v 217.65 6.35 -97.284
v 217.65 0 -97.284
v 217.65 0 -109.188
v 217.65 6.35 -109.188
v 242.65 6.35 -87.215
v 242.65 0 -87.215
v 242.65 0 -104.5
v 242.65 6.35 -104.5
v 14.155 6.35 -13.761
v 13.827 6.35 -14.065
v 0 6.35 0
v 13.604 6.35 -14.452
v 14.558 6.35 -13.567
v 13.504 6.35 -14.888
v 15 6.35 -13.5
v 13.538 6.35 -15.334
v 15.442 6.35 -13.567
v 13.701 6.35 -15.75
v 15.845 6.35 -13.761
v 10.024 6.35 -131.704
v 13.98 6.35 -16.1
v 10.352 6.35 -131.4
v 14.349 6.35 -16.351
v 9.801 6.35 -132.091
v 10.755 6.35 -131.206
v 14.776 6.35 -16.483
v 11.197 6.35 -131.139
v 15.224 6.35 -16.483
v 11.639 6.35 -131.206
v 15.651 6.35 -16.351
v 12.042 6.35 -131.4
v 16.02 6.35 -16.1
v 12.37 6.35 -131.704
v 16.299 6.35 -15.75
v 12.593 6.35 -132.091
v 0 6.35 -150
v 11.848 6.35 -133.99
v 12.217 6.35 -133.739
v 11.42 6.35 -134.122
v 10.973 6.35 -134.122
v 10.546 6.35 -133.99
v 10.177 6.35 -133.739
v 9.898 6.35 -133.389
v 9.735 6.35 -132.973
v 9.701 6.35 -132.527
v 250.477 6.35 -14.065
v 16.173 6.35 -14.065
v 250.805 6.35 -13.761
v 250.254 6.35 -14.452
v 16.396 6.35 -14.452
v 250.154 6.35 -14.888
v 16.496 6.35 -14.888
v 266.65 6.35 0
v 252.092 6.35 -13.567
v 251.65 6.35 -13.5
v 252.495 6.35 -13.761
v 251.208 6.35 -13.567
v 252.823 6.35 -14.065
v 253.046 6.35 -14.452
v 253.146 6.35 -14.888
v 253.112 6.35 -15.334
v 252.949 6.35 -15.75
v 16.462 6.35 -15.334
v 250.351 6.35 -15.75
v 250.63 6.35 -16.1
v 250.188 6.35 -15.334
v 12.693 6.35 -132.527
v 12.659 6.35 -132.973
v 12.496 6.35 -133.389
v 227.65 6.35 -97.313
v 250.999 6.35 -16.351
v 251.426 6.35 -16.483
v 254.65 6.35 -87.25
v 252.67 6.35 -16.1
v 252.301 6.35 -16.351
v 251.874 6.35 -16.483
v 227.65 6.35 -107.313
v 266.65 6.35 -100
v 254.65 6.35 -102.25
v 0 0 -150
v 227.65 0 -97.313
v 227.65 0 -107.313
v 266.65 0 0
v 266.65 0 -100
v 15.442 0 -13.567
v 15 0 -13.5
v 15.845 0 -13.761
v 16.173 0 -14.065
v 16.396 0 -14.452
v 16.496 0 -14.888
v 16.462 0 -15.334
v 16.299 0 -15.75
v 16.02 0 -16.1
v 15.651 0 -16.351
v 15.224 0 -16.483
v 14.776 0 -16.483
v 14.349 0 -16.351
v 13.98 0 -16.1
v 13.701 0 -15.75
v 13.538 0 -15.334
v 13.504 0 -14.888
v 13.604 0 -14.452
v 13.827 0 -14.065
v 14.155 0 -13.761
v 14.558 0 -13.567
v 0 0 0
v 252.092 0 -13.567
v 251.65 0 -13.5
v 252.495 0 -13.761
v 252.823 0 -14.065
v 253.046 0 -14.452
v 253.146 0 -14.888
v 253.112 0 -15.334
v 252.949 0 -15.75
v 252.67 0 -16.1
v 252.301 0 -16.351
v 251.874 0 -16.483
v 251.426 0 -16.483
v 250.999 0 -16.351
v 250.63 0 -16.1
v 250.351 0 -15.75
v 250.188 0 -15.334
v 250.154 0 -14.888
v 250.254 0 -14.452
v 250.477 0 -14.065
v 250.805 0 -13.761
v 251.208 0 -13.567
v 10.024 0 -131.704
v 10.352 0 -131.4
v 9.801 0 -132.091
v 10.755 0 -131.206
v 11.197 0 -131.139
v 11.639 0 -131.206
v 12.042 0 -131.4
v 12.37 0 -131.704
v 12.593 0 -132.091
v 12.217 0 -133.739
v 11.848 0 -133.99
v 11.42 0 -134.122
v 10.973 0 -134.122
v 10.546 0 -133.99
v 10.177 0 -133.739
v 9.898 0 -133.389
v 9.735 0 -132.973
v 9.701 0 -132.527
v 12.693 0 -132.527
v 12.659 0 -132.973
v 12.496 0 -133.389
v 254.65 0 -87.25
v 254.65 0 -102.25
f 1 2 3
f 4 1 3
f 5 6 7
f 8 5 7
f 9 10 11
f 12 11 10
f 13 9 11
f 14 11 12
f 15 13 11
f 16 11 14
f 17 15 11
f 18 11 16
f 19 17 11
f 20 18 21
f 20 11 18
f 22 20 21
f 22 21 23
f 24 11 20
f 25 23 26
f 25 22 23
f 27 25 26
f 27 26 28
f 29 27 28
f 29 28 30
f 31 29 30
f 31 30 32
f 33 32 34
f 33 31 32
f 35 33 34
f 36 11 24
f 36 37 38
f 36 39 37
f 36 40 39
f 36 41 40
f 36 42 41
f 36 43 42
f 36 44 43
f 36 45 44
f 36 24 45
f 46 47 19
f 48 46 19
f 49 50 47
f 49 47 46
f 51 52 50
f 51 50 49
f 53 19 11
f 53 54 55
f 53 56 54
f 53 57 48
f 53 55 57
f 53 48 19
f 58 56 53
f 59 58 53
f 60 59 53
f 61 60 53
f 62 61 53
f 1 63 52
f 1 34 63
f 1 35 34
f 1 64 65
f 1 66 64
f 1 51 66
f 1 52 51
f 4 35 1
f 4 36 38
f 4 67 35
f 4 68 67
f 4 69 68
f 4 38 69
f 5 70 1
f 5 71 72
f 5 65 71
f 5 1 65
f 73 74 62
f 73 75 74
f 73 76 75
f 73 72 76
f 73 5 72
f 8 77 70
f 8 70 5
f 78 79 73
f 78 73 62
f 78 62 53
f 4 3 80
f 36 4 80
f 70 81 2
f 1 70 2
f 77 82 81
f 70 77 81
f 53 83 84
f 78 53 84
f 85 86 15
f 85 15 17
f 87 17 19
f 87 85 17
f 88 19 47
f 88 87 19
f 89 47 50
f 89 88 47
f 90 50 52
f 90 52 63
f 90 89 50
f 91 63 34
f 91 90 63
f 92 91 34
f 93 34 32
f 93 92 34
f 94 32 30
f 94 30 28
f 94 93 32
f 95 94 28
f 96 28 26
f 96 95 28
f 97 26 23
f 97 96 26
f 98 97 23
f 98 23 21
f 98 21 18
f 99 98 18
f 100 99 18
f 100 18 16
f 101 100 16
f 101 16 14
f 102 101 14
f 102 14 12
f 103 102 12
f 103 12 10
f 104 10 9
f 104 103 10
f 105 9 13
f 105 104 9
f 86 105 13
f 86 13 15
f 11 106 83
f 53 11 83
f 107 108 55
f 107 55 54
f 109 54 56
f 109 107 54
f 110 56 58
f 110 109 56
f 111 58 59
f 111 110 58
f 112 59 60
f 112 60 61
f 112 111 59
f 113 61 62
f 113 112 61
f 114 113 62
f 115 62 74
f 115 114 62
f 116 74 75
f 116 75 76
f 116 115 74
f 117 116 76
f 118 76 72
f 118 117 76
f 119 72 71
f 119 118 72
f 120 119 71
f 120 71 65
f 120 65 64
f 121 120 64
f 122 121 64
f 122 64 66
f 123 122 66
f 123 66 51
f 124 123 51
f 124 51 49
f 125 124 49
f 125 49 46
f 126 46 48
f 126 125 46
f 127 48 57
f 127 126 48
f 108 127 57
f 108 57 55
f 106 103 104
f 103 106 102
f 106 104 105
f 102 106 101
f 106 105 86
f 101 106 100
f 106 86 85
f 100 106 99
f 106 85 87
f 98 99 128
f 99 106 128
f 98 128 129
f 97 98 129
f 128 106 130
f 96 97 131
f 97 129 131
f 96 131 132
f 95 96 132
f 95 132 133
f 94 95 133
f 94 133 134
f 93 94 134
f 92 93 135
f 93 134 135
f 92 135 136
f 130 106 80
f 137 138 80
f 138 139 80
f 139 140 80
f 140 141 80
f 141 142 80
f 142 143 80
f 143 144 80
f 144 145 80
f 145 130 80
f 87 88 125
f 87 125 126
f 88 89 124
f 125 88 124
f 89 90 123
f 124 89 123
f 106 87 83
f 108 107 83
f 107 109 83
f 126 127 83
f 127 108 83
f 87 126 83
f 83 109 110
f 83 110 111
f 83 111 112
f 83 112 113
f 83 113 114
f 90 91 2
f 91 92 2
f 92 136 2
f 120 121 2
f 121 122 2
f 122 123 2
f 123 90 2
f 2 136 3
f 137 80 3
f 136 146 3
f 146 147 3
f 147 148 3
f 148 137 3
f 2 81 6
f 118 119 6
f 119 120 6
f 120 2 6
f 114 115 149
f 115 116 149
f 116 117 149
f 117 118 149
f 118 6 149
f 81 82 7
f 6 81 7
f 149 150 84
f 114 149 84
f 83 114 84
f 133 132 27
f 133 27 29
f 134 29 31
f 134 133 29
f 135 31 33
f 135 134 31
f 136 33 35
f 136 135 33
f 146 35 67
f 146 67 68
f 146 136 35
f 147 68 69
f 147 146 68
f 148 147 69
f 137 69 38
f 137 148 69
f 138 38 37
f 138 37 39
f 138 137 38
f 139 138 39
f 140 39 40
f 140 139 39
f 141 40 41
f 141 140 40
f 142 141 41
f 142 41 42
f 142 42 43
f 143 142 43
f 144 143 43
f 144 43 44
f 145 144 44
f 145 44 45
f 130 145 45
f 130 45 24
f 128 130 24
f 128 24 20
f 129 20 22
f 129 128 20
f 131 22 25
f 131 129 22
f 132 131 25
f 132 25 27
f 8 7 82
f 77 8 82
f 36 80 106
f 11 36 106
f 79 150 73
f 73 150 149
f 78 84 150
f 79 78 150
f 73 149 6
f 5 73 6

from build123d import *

# Parameters (mm, degrees)
SKETCH2_R           = 1.5
BOSS_EXTRUDE1_DEPTH = 6.35


with BuildPart() as part:
    # Sketch2 → Boss-Extrude1 (new body)
    with BuildSketch(Plane(origin=(0, 0, 0), x_dir=(1, 0, 0), z_dir=(0, 1, 0))):
        Polygon((0, 0), (266.65, 0), (266.65, 100), (254.65, 102.250140634), (254.65, 87.250140634), (242.650050871, 87.215199066), (242.650050871, 104.500271729), (227.650050871, 107.312947521), (227.650050871, 97.312947521), (217.650050871, 97.283829424), (217.650050871, 109.188064716), (0, 150), align=None)
        with Locations(Location((15, 15, 0), (0, 0, 270))):
            Circle(SKETCH2_R, mode=Mode.SUBTRACT)
        with Locations(Location((251.65, 15, 0), (0, 0, 270))):
            Circle(SKETCH2_R, mode=Mode.SUBTRACT)
        with Locations(Location((11.196927717, 132.639018124, 0), (0, 0, 270))):
            Circle(SKETCH2_R, mode=Mode.SUBTRACT)
    extrude(amount=BOSS_EXTRUDE1_DEPTH)


solid = part.part
